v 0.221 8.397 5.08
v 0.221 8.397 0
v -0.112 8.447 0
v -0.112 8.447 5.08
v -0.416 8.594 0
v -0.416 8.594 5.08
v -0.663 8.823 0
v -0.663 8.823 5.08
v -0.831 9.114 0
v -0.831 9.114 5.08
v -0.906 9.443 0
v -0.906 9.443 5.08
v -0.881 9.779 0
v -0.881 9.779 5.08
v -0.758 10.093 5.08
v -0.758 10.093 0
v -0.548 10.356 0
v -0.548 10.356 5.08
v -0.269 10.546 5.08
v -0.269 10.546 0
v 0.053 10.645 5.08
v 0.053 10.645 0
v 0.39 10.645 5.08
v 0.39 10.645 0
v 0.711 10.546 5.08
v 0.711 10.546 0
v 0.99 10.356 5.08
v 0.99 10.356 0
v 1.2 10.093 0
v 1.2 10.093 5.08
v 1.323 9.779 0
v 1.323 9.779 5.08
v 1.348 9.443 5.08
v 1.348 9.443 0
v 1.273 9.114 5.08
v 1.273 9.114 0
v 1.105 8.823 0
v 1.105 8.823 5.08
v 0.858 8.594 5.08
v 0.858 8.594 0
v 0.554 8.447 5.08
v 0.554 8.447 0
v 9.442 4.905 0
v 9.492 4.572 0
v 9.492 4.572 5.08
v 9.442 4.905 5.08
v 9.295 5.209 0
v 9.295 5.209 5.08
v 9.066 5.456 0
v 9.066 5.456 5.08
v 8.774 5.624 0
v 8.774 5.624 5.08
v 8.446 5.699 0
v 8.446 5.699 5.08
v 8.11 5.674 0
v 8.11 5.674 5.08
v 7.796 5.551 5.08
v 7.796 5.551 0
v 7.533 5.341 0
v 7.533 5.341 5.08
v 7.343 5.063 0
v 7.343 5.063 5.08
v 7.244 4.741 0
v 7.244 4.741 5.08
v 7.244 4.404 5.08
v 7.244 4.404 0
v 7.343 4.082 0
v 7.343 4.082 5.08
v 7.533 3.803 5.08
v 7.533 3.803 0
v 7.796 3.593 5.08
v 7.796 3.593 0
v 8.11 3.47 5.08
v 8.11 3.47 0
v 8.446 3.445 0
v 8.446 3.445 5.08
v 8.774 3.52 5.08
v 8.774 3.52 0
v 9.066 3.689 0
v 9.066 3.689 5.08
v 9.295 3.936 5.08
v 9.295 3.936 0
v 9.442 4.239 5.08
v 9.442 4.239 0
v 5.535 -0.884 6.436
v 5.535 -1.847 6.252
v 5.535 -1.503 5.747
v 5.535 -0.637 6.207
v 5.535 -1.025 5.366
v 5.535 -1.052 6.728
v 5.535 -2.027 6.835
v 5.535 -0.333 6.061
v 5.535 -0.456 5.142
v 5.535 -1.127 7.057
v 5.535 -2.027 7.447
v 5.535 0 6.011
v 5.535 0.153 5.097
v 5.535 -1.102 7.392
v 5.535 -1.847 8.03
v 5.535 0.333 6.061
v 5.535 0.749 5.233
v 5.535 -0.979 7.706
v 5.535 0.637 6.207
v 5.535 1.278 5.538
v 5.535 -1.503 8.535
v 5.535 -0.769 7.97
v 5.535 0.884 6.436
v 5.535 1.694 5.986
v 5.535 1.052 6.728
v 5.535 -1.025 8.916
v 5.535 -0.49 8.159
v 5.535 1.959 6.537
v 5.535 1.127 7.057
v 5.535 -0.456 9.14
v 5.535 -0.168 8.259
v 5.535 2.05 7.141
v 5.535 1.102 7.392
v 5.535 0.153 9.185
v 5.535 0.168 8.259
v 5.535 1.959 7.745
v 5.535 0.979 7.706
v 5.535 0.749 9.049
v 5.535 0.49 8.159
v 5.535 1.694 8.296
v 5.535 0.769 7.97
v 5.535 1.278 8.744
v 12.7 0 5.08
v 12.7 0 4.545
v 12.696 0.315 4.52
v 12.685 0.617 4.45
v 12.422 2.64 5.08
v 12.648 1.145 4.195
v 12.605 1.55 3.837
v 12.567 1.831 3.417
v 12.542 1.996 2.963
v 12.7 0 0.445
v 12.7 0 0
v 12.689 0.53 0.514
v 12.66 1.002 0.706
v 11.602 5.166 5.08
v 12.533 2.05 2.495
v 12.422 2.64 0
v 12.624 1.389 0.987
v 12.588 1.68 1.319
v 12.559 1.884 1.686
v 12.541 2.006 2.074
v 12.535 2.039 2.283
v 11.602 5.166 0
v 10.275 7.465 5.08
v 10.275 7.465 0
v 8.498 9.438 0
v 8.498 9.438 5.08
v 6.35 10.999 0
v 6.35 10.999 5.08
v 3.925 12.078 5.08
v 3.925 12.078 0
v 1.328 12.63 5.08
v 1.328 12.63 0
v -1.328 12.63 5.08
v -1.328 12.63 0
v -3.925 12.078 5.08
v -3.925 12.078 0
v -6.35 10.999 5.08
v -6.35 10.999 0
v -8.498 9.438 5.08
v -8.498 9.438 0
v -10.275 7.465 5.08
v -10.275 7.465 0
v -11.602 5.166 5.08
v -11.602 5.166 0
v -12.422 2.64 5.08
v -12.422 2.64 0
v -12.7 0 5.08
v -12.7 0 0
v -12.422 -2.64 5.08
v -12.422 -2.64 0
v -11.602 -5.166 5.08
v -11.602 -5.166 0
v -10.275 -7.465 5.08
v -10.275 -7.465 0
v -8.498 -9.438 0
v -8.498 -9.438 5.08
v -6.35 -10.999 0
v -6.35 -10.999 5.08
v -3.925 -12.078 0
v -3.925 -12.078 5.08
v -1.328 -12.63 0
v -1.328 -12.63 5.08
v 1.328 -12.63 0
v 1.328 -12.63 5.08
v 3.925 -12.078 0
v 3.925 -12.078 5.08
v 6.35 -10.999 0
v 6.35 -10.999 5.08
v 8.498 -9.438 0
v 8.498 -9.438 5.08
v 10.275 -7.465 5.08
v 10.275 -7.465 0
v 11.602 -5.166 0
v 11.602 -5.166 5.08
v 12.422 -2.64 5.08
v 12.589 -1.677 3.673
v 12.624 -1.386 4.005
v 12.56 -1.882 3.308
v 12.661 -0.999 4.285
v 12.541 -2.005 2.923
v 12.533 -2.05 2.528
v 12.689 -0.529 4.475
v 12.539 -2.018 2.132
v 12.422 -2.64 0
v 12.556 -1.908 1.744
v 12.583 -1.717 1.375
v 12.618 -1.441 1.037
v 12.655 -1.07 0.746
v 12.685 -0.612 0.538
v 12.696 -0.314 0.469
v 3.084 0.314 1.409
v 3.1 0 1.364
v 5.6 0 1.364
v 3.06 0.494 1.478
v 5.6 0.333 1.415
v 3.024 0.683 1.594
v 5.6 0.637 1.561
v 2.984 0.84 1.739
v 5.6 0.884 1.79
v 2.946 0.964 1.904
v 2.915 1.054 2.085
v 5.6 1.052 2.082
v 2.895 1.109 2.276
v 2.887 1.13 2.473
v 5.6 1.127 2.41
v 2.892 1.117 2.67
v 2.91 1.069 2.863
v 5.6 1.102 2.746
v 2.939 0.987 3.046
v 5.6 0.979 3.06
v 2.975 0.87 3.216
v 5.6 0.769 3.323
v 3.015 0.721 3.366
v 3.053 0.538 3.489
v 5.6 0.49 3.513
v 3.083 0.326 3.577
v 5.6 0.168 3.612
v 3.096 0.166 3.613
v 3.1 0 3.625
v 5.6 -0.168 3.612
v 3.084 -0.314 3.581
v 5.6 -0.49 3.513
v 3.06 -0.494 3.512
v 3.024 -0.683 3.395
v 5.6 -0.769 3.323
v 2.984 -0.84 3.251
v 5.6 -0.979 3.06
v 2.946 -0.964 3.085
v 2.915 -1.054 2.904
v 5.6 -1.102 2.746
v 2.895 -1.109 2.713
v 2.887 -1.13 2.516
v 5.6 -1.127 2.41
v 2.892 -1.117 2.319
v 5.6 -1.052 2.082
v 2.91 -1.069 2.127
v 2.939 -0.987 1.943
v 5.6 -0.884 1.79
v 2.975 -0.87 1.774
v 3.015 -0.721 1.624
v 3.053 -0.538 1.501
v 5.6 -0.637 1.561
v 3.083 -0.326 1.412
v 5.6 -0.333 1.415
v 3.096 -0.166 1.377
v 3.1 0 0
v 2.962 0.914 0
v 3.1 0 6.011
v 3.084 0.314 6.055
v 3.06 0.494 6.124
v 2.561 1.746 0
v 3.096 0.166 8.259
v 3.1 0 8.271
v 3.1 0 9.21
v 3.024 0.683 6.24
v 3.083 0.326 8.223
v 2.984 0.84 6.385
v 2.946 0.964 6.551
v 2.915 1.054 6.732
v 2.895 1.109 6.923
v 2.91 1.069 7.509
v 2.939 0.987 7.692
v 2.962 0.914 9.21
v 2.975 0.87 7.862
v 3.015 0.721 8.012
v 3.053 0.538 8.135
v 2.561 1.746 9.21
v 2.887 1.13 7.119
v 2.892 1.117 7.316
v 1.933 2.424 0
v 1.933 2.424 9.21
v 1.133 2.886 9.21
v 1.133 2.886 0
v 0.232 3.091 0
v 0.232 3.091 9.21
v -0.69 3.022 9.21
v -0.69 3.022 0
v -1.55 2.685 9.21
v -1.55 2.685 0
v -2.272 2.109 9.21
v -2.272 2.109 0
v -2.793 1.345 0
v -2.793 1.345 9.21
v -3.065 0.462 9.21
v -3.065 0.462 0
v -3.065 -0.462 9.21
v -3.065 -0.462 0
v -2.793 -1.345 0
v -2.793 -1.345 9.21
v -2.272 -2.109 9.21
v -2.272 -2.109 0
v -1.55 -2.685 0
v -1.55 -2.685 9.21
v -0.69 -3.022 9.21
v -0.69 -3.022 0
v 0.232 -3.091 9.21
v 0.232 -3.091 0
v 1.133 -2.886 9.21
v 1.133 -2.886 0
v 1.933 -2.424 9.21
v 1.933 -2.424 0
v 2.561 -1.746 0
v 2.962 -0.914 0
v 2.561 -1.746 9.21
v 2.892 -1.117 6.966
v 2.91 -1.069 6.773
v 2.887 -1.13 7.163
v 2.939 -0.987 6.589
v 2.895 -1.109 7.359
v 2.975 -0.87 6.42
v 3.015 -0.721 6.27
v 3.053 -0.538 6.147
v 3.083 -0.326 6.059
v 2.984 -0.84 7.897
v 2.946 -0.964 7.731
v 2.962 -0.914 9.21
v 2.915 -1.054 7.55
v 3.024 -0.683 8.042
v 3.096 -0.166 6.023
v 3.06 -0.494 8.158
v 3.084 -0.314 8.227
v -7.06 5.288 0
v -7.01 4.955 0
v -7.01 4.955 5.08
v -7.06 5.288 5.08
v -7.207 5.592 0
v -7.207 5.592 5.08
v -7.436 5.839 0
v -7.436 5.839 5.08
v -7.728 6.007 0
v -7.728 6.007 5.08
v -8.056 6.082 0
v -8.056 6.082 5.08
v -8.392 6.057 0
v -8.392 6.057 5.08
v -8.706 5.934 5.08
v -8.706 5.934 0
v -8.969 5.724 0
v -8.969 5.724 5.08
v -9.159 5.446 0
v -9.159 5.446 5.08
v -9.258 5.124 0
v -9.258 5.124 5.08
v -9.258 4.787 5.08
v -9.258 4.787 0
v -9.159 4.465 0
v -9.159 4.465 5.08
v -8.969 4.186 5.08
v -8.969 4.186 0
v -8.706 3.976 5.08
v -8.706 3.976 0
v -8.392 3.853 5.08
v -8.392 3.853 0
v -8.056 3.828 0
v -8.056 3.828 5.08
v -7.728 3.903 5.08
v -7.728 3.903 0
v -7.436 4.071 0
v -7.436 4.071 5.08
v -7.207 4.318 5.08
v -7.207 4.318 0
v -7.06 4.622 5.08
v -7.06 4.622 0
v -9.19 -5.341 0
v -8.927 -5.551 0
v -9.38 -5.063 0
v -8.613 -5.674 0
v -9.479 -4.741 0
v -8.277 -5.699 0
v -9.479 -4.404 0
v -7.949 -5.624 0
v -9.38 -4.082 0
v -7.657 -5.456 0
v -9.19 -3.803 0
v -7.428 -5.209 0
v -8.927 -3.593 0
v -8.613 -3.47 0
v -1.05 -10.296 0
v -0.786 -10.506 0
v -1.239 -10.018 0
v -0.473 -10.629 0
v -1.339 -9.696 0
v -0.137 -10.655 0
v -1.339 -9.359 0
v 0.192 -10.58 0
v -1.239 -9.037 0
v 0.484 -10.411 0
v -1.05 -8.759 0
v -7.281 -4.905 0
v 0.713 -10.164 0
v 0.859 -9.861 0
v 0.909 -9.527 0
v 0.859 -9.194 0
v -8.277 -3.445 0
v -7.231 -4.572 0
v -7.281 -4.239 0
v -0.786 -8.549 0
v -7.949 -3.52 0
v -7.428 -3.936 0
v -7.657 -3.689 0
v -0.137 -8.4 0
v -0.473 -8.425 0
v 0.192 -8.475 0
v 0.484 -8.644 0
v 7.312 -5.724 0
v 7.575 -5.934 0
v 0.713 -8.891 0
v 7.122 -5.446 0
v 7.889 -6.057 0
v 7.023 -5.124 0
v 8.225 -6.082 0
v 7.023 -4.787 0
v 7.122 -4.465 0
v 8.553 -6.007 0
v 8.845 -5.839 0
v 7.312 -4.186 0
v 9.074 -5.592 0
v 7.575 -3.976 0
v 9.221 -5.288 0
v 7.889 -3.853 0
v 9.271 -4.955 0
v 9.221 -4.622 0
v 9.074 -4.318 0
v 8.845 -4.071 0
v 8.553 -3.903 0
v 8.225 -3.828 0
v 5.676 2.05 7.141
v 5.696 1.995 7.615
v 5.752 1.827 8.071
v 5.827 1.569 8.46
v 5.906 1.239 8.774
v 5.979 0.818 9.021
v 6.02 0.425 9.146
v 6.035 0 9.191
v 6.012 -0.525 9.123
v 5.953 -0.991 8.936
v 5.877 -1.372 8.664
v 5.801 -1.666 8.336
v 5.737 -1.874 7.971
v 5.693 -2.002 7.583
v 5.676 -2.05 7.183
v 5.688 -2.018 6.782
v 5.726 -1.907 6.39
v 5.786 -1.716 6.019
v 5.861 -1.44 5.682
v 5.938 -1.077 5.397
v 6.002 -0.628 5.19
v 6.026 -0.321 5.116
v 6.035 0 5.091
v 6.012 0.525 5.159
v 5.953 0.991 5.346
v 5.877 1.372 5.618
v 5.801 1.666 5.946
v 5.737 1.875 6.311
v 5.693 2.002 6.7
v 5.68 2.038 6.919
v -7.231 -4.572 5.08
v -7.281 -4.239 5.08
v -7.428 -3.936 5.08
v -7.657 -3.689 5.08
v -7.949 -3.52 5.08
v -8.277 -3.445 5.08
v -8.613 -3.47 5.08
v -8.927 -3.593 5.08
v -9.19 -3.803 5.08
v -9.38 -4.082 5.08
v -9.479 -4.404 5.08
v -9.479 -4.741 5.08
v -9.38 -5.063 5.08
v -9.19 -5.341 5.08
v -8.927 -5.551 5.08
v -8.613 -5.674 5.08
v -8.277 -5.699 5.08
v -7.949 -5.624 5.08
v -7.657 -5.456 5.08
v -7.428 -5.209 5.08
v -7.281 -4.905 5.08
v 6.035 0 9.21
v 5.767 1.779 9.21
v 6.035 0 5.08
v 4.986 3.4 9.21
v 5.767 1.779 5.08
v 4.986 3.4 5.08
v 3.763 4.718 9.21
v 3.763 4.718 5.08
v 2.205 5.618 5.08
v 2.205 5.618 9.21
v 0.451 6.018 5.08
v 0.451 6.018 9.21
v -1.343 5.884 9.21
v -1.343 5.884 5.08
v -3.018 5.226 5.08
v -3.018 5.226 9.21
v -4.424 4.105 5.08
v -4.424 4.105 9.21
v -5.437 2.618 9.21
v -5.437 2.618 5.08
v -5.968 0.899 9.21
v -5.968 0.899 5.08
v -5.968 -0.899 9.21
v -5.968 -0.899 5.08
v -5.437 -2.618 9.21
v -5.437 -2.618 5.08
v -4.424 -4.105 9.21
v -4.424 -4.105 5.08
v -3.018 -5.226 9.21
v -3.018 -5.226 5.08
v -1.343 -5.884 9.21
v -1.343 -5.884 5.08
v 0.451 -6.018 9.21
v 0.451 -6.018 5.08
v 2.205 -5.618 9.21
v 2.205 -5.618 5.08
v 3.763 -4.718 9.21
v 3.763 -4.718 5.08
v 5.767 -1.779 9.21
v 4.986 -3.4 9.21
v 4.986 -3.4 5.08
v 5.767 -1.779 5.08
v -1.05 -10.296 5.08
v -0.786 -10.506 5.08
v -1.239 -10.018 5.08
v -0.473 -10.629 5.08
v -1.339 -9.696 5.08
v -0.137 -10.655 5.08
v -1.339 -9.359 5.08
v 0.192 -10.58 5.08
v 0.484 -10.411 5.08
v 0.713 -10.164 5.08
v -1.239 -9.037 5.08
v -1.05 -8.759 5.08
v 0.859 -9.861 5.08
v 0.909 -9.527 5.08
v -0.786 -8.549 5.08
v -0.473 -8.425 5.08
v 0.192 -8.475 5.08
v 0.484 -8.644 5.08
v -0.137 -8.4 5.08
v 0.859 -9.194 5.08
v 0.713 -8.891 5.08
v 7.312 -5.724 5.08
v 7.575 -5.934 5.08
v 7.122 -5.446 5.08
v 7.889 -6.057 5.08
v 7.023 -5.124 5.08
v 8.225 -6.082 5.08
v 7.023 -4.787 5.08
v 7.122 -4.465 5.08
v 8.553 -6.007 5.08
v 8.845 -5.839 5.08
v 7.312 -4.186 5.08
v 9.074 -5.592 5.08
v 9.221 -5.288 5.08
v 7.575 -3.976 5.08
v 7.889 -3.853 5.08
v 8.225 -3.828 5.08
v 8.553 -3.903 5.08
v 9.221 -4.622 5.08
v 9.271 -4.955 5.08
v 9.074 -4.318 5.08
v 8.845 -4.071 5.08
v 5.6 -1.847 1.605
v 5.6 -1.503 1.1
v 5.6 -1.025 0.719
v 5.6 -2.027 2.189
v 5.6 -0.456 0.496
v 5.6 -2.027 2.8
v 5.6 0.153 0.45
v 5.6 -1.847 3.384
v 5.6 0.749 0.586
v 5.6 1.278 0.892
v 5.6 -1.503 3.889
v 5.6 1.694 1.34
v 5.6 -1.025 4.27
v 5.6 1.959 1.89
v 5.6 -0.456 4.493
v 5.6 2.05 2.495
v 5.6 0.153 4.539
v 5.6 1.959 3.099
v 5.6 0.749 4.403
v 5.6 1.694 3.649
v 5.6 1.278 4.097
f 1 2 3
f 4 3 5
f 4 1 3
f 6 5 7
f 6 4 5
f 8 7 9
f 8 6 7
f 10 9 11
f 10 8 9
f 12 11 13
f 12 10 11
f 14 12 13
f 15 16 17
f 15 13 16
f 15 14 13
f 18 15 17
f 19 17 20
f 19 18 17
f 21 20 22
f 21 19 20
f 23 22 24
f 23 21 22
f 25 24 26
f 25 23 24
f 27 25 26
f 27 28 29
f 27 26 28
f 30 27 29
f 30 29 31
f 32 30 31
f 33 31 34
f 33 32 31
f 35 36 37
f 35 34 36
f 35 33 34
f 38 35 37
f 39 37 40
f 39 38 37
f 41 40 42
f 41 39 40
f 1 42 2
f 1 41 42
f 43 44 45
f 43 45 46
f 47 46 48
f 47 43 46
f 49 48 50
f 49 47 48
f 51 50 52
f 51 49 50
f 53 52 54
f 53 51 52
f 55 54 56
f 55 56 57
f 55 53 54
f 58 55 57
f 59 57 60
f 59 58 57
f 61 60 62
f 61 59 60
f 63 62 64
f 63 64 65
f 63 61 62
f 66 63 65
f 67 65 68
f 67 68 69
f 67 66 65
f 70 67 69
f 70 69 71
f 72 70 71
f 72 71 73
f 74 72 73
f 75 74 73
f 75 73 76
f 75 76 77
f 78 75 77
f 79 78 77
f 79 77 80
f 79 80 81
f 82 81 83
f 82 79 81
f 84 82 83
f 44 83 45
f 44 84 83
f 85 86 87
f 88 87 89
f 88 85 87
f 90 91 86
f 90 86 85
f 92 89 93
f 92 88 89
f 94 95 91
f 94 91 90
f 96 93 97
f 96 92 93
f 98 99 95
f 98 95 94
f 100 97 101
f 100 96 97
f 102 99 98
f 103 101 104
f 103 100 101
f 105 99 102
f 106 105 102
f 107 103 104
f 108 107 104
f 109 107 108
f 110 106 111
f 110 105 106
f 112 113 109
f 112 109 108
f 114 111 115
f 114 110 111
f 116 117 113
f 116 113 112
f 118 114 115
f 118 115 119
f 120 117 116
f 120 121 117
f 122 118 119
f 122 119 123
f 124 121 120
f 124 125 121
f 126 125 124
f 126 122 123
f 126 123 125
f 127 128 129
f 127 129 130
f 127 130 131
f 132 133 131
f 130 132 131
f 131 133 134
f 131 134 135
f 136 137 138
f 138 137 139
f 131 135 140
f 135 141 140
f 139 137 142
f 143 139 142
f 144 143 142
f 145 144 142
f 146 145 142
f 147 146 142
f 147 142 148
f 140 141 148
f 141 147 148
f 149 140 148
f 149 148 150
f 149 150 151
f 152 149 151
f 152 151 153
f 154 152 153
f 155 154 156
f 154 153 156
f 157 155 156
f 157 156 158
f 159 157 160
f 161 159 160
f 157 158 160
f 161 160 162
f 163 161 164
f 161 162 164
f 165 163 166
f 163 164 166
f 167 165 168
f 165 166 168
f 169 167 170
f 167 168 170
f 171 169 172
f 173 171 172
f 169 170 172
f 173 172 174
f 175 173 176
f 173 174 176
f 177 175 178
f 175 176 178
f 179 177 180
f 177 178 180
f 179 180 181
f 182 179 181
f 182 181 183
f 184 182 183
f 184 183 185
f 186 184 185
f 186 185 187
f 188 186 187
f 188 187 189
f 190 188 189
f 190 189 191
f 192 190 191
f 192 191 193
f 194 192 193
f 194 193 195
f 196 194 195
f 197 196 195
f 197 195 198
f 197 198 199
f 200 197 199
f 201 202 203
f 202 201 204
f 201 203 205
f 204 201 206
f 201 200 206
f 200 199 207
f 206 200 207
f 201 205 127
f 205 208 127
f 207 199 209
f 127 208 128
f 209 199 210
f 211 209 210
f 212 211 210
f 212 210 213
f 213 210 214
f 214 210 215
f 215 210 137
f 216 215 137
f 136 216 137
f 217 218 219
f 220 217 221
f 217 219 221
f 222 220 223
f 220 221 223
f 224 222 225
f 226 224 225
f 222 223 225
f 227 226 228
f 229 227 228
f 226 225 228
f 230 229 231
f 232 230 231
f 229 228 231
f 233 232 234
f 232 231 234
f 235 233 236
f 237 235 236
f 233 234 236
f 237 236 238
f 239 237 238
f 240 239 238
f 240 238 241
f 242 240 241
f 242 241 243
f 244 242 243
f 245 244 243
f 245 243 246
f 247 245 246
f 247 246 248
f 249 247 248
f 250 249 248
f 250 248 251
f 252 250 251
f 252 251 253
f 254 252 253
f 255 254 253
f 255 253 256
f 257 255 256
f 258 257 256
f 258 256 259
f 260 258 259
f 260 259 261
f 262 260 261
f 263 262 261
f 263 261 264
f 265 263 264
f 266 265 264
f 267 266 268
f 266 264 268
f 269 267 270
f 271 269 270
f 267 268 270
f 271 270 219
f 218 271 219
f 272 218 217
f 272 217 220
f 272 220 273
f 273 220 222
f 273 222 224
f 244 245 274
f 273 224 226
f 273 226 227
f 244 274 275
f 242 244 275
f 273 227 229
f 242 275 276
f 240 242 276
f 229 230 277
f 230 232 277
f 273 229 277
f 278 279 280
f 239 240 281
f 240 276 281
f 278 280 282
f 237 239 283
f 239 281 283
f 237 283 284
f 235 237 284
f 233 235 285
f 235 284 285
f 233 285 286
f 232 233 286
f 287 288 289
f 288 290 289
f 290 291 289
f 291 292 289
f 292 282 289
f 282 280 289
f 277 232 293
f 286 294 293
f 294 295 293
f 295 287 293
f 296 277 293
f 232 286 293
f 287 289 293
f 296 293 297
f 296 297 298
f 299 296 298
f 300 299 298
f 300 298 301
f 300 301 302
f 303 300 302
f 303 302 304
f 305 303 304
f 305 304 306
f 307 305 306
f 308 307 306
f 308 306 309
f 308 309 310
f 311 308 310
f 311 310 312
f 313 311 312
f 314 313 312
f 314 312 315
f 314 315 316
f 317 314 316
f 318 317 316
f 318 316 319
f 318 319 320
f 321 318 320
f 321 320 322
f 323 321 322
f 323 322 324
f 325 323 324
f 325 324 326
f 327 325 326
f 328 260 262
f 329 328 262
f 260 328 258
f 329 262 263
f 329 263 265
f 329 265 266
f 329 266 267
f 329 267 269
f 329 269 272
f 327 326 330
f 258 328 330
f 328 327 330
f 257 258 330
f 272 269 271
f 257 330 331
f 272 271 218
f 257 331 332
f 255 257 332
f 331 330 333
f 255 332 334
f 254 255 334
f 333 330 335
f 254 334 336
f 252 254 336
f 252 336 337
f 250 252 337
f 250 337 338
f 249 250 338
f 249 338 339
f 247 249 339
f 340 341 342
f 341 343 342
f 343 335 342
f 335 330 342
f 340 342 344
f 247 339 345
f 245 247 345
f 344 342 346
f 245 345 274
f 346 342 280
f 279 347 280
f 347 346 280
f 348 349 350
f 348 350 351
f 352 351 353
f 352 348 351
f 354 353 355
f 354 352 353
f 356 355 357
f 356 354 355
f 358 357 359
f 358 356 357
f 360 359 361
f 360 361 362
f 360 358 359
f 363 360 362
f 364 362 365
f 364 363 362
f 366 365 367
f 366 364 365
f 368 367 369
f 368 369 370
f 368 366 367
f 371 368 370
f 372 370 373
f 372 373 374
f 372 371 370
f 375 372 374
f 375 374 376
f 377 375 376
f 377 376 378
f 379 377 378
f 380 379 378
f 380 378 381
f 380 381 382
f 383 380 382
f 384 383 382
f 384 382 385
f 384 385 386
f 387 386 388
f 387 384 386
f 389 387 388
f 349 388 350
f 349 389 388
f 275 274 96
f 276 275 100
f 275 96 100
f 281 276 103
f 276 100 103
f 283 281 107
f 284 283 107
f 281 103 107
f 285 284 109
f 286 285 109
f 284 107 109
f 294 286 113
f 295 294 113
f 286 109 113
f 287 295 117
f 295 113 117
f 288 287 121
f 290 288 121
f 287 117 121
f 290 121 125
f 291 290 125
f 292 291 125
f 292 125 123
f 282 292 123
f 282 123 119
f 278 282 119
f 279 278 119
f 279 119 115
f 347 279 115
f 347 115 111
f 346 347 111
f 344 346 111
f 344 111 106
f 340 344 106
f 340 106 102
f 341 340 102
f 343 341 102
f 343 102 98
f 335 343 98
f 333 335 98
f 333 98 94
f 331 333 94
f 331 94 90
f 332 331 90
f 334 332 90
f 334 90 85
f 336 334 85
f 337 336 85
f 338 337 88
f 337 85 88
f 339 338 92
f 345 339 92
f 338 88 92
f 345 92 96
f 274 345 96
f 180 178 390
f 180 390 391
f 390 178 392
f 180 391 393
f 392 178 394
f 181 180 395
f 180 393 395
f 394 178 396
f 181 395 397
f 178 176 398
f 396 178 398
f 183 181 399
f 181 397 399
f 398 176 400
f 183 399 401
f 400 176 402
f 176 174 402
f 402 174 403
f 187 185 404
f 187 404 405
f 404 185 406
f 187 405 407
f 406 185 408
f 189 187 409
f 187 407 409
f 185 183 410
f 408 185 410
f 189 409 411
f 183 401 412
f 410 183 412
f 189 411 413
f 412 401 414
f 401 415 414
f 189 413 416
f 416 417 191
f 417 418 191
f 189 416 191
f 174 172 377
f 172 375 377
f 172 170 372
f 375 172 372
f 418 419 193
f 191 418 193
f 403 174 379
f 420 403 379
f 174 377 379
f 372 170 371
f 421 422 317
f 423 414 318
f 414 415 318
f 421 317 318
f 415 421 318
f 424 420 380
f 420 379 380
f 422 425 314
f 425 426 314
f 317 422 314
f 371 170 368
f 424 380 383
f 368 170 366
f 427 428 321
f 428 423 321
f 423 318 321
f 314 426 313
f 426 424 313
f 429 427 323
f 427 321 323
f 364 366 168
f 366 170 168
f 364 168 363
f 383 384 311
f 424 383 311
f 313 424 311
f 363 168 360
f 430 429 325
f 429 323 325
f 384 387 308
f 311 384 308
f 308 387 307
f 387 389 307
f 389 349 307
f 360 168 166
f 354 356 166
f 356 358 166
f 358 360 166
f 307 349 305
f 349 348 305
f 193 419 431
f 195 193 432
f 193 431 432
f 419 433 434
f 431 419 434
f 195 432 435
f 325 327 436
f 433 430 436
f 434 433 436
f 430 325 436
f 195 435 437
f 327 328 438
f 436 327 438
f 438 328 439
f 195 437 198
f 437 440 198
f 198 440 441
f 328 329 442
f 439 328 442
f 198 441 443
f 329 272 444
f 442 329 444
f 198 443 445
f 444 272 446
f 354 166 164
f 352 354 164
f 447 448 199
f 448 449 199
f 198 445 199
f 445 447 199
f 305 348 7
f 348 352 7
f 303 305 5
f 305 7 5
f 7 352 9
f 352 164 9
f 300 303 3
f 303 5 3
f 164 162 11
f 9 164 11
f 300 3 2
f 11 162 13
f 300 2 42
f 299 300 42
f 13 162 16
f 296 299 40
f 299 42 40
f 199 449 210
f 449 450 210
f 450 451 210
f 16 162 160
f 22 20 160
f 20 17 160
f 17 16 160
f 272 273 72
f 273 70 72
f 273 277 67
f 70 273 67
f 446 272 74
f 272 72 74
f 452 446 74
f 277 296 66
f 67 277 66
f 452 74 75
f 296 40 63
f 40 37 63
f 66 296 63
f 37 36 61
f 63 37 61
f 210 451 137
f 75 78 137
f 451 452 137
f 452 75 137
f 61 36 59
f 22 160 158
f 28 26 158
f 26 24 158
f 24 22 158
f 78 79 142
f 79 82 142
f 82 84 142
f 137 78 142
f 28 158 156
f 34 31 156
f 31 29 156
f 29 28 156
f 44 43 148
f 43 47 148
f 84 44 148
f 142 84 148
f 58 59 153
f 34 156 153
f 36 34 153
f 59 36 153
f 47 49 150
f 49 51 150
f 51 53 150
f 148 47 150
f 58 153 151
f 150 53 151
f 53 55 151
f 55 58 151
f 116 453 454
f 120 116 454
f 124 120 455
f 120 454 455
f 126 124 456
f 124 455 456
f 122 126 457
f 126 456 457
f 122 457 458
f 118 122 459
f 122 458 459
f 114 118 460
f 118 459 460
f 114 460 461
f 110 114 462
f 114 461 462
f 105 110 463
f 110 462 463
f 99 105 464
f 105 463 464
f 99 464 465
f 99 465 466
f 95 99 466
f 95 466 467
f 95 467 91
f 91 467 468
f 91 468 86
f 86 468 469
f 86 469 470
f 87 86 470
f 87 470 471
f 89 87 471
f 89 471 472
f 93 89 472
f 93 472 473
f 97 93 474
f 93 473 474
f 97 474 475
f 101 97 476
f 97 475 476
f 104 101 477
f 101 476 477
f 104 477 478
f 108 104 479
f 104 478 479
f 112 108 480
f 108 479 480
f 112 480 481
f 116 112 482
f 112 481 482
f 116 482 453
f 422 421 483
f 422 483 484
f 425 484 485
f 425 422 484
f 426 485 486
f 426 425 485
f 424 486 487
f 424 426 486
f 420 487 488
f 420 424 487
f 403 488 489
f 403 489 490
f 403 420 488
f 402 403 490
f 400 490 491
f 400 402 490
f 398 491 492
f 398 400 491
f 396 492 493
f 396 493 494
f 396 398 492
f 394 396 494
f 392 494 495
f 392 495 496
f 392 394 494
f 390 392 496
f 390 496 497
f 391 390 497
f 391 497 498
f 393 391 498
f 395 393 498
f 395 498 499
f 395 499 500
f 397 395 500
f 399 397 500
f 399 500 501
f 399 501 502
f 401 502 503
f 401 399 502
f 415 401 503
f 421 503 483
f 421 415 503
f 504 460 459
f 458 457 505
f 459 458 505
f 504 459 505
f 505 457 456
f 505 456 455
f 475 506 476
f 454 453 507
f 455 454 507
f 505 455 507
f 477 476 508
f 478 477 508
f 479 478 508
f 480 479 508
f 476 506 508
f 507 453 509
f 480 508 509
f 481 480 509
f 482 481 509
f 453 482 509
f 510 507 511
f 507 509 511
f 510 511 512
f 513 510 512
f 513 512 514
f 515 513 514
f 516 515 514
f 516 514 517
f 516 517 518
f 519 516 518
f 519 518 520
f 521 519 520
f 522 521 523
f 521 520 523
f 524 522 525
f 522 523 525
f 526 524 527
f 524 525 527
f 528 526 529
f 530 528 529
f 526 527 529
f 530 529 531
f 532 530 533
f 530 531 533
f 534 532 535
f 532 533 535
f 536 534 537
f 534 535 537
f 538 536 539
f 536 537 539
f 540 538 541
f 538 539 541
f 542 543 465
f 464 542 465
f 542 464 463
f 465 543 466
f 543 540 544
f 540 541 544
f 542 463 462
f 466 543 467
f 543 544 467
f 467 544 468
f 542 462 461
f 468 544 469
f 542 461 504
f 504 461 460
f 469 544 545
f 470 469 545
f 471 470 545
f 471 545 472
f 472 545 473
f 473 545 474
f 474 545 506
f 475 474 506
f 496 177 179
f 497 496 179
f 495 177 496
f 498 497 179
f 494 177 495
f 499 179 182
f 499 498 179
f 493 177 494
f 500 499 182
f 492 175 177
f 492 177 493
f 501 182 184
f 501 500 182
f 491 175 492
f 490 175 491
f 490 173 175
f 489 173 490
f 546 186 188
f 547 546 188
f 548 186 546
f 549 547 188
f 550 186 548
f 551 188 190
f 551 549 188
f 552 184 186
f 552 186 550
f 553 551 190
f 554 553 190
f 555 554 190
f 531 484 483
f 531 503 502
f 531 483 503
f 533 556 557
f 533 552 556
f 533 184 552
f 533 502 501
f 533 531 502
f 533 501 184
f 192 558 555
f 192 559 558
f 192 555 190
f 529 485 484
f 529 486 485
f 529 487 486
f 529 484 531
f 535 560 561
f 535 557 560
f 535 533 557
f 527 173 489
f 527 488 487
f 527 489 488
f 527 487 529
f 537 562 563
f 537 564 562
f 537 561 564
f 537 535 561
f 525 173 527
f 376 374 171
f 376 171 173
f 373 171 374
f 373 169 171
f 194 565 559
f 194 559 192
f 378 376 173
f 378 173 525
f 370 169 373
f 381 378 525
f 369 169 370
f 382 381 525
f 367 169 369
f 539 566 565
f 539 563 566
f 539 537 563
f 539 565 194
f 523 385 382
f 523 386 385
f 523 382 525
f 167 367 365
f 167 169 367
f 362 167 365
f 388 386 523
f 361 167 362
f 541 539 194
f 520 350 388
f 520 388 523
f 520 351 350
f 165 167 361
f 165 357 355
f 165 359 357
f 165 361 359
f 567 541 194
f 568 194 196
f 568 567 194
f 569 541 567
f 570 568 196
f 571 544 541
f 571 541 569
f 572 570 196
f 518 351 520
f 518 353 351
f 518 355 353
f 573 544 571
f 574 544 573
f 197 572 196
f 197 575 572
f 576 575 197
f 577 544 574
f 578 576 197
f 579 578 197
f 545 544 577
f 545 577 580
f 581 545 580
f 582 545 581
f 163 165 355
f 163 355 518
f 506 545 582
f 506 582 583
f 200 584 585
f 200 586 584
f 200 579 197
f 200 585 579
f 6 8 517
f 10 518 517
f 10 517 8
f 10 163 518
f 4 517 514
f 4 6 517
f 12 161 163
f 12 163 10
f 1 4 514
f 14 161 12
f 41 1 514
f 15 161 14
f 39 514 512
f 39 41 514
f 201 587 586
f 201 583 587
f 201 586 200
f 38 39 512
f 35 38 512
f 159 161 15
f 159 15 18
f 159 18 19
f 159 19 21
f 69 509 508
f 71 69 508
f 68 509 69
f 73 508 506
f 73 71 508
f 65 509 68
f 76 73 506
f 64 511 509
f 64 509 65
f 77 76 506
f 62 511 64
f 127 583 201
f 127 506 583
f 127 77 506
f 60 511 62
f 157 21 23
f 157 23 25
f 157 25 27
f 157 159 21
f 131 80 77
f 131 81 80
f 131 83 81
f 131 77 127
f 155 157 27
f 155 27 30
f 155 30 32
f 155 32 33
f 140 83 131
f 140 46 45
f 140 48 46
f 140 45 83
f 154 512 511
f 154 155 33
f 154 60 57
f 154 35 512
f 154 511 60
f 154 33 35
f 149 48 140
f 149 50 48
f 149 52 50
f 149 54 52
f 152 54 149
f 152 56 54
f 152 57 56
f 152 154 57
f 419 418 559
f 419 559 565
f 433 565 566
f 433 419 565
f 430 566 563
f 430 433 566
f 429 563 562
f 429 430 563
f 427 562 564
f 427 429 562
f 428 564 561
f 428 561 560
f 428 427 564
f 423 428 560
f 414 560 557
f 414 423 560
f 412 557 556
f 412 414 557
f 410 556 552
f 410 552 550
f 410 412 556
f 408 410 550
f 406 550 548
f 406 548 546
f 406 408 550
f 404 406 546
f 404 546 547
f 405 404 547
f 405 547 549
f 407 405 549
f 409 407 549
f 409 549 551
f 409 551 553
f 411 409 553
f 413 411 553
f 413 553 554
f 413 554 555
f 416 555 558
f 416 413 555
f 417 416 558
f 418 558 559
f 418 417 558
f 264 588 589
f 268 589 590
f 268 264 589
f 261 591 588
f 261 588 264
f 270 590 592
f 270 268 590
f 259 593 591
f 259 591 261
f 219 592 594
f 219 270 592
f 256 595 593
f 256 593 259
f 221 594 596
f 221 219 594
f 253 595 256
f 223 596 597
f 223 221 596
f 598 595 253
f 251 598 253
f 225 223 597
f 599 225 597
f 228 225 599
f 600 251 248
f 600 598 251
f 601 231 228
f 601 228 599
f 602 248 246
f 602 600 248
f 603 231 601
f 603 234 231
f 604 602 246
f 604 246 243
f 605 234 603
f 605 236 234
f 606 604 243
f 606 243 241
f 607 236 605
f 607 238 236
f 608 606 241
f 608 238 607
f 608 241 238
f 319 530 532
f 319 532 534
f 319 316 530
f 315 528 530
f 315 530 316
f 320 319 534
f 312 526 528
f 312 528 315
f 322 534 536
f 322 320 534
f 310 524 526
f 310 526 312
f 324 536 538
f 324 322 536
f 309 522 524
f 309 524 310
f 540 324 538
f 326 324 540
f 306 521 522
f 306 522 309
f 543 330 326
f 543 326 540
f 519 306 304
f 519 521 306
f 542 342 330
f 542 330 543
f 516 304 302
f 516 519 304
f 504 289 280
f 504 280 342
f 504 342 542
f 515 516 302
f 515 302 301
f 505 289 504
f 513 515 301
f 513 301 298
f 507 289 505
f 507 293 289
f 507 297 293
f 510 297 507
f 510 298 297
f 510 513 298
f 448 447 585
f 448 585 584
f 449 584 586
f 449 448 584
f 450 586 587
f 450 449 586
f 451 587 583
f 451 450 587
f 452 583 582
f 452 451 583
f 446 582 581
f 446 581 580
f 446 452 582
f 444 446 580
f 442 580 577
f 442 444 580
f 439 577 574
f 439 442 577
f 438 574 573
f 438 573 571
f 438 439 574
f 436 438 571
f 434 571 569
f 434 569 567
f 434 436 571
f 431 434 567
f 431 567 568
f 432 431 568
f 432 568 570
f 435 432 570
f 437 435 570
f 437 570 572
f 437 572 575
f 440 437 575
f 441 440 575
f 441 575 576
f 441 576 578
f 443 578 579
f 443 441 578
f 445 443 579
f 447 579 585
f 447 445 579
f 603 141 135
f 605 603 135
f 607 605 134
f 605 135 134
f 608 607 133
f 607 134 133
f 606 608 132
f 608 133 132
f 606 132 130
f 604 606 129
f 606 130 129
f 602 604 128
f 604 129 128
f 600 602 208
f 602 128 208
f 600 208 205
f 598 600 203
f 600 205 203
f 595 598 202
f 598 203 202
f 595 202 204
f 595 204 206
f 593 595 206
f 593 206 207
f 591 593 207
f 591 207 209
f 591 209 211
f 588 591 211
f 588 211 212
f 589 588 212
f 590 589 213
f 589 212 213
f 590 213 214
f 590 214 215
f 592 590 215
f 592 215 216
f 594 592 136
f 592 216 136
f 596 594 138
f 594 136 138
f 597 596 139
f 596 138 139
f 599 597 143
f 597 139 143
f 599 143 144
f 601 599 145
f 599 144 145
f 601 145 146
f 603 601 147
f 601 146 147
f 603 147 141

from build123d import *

# Parameters (mm, degrees)
SKETCH1_R                  = 12.7
BOSS_EXTRUDE1_DEPTH        = 5.08
SKETCH2_R                  = 6.035
BOSS_EXTRUDE2_DEPTH        = 4.13
CUT_EXTRUDE1_REACH         = 22.184
SKETCH3_R                  = 3.1
CRVPATTERN1_OUTLINE_R      = 1.1303
CRVPATTERN1_DEPTH          = 5.08
SKETCH16_R                 = 2.05
CUT_EXTRUDE2_DEPTH         = 0.5
F_4_40_TAPPED_HOLE3_REACH  = 26.055
F_4_40_TAPPED_HOLE3_BORE_R = 1.1303
SKETCH24_R                 = 2.05
CUT_EXTRUDE3_DEPTH         = 7.1
F_4_40_TAPPED_HOLE4_REACH  = 26.104
F_4_40_TAPPED_HOLE4_BORE_R = 1.1303


# Read off the part's stored shape, not the designer's step: CrvPattern1
with BuildPart() as part:
    # Sketch1 → Boss-Extrude1 (new body)
    with BuildSketch(Plane.XY):
        Circle(SKETCH1_R)
    extrude(amount=BOSS_EXTRUDE1_DEPTH)

    # Sketch2 → Boss-Extrude2 (add)
    with BuildSketch(Plane.XY.offset(5.08)):
        Circle(SKETCH2_R)
    extrude(amount=BOSS_EXTRUDE2_DEPTH)

    # Sketch3 → Cut-Extrude1 (cut, up to next)
    with BuildSketch(Plane.XY.offset(9.21), mode=Mode.PRIVATE) as cut_extrude1_sk1:
        Circle(SKETCH3_R)
    cut_extrude1_tool1 = extrude(cut_extrude1_sk1.sketch, amount=-CUT_EXTRUDE1_REACH, mode=Mode.PRIVATE) & part.part
    add(cut_extrude1_tool1.solids().sort_by_distance((0, 0, 9.21))[0], mode=Mode.SUBTRACT)

    # Sketch10 → #4-40 Tapped Hole2 (revolve, cut)
    with BuildSketch(Plane(origin=(0.221066647, 9.527435622, 5.08), x_dir=(0, -1, 0), z_dir=(1, 0, 0))):
        Polygon((0, 0), (0, 8.279152758), (1.1303, 7.6), (1.1303, 0), align=None)
    revolve(axis=Axis((0.221066647, 9.527435622, 11.43), (0, 0, -1)), mode=Mode.SUBTRACT)

    # CrvPattern1 outline → CrvPattern1 (cut)
    with BuildSketch(Plane.XY):
        with Locations((-8.140467958, 4.955167144)):
            Circle(CRVPATTERN1_OUTLINE_R)
        with Locations((-8.361534605, -4.572268479)):
            Circle(CRVPATTERN1_OUTLINE_R)
        with Locations((-0.221066647, -9.527435622)):
            Circle(CRVPATTERN1_OUTLINE_R)
        with Locations((8.140467958, -4.955167144)):
            Circle(CRVPATTERN1_OUTLINE_R)
        with Locations((8.361534605, 4.572268479)):
            Circle(CRVPATTERN1_OUTLINE_R)
    extrude(amount=CRVPATTERN1_DEPTH, mode=Mode.SUBTRACT)

    # Sketch16 → Cut-Extrude2 (cut)
    with BuildSketch(Plane(origin=(6.035, 0, 9.21), x_dir=(0, 0, -1), z_dir=(1, 0, 0))):
        with Locations(Location((2.069027283, 0, 0), (0, 0, 90))):
            Circle(SKETCH16_R)
    extrude(amount=-CUT_EXTRUDE2_DEPTH, mode=Mode.SUBTRACT)

    # #4-40 Tapped Hole3 bore → #4-40 Tapped Hole3 (cut, up to next)
    with BuildSketch(Plane(origin=(5.535, 0, 0), x_dir=(0, 0, -1), z_dir=(1, 0, 0)), mode=Mode.PRIVATE) as f_4_40_tapped_hole3_sk1:
        with Locations((-7.140972717, 0)):
            Circle(F_4_40_TAPPED_HOLE3_BORE_R)
    f_4_40_tapped_hole3_tool1 = extrude(f_4_40_tapped_hole3_sk1.sketch, amount=-F_4_40_TAPPED_HOLE3_REACH, mode=Mode.PRIVATE) & part.part
    add(f_4_40_tapped_hole3_tool1.solids().sort_by_distance((5.535, 0, 7.140973))[0], mode=Mode.SUBTRACT)

    # Sketch24 → Cut-Extrude3 (cut)
    with BuildSketch(Plane(origin=(12.7, 0, 5.08), x_dir=(0, 0, -1), z_dir=(1, 0, 0))):
        with Locations(Location((2.585319139, 0, 0), (0, 0, 90))):
            Circle(SKETCH24_R)
    extrude(amount=-CUT_EXTRUDE3_DEPTH, mode=Mode.SUBTRACT)

    # #4-40 Tapped Hole4 bore → #4-40 Tapped Hole4 (cut, up to next)
    with BuildSketch(Plane(origin=(5.6, 0, 0), x_dir=(0, 0, -1), z_dir=(1, 0, 0)), mode=Mode.PRIVATE) as f_4_40_tapped_hole4_sk1:
        with Locations((-2.494680861, 0)):
            Circle(F_4_40_TAPPED_HOLE4_BORE_R)
    f_4_40_tapped_hole4_tool1 = extrude(f_4_40_tapped_hole4_sk1.sketch, amount=-F_4_40_TAPPED_HOLE4_REACH, mode=Mode.PRIVATE) & part.part
    add(f_4_40_tapped_hole4_tool1.solids().sort_by_distance((5.6, 0, 2.494681))[0], mode=Mode.SUBTRACT)


solid = part.part
